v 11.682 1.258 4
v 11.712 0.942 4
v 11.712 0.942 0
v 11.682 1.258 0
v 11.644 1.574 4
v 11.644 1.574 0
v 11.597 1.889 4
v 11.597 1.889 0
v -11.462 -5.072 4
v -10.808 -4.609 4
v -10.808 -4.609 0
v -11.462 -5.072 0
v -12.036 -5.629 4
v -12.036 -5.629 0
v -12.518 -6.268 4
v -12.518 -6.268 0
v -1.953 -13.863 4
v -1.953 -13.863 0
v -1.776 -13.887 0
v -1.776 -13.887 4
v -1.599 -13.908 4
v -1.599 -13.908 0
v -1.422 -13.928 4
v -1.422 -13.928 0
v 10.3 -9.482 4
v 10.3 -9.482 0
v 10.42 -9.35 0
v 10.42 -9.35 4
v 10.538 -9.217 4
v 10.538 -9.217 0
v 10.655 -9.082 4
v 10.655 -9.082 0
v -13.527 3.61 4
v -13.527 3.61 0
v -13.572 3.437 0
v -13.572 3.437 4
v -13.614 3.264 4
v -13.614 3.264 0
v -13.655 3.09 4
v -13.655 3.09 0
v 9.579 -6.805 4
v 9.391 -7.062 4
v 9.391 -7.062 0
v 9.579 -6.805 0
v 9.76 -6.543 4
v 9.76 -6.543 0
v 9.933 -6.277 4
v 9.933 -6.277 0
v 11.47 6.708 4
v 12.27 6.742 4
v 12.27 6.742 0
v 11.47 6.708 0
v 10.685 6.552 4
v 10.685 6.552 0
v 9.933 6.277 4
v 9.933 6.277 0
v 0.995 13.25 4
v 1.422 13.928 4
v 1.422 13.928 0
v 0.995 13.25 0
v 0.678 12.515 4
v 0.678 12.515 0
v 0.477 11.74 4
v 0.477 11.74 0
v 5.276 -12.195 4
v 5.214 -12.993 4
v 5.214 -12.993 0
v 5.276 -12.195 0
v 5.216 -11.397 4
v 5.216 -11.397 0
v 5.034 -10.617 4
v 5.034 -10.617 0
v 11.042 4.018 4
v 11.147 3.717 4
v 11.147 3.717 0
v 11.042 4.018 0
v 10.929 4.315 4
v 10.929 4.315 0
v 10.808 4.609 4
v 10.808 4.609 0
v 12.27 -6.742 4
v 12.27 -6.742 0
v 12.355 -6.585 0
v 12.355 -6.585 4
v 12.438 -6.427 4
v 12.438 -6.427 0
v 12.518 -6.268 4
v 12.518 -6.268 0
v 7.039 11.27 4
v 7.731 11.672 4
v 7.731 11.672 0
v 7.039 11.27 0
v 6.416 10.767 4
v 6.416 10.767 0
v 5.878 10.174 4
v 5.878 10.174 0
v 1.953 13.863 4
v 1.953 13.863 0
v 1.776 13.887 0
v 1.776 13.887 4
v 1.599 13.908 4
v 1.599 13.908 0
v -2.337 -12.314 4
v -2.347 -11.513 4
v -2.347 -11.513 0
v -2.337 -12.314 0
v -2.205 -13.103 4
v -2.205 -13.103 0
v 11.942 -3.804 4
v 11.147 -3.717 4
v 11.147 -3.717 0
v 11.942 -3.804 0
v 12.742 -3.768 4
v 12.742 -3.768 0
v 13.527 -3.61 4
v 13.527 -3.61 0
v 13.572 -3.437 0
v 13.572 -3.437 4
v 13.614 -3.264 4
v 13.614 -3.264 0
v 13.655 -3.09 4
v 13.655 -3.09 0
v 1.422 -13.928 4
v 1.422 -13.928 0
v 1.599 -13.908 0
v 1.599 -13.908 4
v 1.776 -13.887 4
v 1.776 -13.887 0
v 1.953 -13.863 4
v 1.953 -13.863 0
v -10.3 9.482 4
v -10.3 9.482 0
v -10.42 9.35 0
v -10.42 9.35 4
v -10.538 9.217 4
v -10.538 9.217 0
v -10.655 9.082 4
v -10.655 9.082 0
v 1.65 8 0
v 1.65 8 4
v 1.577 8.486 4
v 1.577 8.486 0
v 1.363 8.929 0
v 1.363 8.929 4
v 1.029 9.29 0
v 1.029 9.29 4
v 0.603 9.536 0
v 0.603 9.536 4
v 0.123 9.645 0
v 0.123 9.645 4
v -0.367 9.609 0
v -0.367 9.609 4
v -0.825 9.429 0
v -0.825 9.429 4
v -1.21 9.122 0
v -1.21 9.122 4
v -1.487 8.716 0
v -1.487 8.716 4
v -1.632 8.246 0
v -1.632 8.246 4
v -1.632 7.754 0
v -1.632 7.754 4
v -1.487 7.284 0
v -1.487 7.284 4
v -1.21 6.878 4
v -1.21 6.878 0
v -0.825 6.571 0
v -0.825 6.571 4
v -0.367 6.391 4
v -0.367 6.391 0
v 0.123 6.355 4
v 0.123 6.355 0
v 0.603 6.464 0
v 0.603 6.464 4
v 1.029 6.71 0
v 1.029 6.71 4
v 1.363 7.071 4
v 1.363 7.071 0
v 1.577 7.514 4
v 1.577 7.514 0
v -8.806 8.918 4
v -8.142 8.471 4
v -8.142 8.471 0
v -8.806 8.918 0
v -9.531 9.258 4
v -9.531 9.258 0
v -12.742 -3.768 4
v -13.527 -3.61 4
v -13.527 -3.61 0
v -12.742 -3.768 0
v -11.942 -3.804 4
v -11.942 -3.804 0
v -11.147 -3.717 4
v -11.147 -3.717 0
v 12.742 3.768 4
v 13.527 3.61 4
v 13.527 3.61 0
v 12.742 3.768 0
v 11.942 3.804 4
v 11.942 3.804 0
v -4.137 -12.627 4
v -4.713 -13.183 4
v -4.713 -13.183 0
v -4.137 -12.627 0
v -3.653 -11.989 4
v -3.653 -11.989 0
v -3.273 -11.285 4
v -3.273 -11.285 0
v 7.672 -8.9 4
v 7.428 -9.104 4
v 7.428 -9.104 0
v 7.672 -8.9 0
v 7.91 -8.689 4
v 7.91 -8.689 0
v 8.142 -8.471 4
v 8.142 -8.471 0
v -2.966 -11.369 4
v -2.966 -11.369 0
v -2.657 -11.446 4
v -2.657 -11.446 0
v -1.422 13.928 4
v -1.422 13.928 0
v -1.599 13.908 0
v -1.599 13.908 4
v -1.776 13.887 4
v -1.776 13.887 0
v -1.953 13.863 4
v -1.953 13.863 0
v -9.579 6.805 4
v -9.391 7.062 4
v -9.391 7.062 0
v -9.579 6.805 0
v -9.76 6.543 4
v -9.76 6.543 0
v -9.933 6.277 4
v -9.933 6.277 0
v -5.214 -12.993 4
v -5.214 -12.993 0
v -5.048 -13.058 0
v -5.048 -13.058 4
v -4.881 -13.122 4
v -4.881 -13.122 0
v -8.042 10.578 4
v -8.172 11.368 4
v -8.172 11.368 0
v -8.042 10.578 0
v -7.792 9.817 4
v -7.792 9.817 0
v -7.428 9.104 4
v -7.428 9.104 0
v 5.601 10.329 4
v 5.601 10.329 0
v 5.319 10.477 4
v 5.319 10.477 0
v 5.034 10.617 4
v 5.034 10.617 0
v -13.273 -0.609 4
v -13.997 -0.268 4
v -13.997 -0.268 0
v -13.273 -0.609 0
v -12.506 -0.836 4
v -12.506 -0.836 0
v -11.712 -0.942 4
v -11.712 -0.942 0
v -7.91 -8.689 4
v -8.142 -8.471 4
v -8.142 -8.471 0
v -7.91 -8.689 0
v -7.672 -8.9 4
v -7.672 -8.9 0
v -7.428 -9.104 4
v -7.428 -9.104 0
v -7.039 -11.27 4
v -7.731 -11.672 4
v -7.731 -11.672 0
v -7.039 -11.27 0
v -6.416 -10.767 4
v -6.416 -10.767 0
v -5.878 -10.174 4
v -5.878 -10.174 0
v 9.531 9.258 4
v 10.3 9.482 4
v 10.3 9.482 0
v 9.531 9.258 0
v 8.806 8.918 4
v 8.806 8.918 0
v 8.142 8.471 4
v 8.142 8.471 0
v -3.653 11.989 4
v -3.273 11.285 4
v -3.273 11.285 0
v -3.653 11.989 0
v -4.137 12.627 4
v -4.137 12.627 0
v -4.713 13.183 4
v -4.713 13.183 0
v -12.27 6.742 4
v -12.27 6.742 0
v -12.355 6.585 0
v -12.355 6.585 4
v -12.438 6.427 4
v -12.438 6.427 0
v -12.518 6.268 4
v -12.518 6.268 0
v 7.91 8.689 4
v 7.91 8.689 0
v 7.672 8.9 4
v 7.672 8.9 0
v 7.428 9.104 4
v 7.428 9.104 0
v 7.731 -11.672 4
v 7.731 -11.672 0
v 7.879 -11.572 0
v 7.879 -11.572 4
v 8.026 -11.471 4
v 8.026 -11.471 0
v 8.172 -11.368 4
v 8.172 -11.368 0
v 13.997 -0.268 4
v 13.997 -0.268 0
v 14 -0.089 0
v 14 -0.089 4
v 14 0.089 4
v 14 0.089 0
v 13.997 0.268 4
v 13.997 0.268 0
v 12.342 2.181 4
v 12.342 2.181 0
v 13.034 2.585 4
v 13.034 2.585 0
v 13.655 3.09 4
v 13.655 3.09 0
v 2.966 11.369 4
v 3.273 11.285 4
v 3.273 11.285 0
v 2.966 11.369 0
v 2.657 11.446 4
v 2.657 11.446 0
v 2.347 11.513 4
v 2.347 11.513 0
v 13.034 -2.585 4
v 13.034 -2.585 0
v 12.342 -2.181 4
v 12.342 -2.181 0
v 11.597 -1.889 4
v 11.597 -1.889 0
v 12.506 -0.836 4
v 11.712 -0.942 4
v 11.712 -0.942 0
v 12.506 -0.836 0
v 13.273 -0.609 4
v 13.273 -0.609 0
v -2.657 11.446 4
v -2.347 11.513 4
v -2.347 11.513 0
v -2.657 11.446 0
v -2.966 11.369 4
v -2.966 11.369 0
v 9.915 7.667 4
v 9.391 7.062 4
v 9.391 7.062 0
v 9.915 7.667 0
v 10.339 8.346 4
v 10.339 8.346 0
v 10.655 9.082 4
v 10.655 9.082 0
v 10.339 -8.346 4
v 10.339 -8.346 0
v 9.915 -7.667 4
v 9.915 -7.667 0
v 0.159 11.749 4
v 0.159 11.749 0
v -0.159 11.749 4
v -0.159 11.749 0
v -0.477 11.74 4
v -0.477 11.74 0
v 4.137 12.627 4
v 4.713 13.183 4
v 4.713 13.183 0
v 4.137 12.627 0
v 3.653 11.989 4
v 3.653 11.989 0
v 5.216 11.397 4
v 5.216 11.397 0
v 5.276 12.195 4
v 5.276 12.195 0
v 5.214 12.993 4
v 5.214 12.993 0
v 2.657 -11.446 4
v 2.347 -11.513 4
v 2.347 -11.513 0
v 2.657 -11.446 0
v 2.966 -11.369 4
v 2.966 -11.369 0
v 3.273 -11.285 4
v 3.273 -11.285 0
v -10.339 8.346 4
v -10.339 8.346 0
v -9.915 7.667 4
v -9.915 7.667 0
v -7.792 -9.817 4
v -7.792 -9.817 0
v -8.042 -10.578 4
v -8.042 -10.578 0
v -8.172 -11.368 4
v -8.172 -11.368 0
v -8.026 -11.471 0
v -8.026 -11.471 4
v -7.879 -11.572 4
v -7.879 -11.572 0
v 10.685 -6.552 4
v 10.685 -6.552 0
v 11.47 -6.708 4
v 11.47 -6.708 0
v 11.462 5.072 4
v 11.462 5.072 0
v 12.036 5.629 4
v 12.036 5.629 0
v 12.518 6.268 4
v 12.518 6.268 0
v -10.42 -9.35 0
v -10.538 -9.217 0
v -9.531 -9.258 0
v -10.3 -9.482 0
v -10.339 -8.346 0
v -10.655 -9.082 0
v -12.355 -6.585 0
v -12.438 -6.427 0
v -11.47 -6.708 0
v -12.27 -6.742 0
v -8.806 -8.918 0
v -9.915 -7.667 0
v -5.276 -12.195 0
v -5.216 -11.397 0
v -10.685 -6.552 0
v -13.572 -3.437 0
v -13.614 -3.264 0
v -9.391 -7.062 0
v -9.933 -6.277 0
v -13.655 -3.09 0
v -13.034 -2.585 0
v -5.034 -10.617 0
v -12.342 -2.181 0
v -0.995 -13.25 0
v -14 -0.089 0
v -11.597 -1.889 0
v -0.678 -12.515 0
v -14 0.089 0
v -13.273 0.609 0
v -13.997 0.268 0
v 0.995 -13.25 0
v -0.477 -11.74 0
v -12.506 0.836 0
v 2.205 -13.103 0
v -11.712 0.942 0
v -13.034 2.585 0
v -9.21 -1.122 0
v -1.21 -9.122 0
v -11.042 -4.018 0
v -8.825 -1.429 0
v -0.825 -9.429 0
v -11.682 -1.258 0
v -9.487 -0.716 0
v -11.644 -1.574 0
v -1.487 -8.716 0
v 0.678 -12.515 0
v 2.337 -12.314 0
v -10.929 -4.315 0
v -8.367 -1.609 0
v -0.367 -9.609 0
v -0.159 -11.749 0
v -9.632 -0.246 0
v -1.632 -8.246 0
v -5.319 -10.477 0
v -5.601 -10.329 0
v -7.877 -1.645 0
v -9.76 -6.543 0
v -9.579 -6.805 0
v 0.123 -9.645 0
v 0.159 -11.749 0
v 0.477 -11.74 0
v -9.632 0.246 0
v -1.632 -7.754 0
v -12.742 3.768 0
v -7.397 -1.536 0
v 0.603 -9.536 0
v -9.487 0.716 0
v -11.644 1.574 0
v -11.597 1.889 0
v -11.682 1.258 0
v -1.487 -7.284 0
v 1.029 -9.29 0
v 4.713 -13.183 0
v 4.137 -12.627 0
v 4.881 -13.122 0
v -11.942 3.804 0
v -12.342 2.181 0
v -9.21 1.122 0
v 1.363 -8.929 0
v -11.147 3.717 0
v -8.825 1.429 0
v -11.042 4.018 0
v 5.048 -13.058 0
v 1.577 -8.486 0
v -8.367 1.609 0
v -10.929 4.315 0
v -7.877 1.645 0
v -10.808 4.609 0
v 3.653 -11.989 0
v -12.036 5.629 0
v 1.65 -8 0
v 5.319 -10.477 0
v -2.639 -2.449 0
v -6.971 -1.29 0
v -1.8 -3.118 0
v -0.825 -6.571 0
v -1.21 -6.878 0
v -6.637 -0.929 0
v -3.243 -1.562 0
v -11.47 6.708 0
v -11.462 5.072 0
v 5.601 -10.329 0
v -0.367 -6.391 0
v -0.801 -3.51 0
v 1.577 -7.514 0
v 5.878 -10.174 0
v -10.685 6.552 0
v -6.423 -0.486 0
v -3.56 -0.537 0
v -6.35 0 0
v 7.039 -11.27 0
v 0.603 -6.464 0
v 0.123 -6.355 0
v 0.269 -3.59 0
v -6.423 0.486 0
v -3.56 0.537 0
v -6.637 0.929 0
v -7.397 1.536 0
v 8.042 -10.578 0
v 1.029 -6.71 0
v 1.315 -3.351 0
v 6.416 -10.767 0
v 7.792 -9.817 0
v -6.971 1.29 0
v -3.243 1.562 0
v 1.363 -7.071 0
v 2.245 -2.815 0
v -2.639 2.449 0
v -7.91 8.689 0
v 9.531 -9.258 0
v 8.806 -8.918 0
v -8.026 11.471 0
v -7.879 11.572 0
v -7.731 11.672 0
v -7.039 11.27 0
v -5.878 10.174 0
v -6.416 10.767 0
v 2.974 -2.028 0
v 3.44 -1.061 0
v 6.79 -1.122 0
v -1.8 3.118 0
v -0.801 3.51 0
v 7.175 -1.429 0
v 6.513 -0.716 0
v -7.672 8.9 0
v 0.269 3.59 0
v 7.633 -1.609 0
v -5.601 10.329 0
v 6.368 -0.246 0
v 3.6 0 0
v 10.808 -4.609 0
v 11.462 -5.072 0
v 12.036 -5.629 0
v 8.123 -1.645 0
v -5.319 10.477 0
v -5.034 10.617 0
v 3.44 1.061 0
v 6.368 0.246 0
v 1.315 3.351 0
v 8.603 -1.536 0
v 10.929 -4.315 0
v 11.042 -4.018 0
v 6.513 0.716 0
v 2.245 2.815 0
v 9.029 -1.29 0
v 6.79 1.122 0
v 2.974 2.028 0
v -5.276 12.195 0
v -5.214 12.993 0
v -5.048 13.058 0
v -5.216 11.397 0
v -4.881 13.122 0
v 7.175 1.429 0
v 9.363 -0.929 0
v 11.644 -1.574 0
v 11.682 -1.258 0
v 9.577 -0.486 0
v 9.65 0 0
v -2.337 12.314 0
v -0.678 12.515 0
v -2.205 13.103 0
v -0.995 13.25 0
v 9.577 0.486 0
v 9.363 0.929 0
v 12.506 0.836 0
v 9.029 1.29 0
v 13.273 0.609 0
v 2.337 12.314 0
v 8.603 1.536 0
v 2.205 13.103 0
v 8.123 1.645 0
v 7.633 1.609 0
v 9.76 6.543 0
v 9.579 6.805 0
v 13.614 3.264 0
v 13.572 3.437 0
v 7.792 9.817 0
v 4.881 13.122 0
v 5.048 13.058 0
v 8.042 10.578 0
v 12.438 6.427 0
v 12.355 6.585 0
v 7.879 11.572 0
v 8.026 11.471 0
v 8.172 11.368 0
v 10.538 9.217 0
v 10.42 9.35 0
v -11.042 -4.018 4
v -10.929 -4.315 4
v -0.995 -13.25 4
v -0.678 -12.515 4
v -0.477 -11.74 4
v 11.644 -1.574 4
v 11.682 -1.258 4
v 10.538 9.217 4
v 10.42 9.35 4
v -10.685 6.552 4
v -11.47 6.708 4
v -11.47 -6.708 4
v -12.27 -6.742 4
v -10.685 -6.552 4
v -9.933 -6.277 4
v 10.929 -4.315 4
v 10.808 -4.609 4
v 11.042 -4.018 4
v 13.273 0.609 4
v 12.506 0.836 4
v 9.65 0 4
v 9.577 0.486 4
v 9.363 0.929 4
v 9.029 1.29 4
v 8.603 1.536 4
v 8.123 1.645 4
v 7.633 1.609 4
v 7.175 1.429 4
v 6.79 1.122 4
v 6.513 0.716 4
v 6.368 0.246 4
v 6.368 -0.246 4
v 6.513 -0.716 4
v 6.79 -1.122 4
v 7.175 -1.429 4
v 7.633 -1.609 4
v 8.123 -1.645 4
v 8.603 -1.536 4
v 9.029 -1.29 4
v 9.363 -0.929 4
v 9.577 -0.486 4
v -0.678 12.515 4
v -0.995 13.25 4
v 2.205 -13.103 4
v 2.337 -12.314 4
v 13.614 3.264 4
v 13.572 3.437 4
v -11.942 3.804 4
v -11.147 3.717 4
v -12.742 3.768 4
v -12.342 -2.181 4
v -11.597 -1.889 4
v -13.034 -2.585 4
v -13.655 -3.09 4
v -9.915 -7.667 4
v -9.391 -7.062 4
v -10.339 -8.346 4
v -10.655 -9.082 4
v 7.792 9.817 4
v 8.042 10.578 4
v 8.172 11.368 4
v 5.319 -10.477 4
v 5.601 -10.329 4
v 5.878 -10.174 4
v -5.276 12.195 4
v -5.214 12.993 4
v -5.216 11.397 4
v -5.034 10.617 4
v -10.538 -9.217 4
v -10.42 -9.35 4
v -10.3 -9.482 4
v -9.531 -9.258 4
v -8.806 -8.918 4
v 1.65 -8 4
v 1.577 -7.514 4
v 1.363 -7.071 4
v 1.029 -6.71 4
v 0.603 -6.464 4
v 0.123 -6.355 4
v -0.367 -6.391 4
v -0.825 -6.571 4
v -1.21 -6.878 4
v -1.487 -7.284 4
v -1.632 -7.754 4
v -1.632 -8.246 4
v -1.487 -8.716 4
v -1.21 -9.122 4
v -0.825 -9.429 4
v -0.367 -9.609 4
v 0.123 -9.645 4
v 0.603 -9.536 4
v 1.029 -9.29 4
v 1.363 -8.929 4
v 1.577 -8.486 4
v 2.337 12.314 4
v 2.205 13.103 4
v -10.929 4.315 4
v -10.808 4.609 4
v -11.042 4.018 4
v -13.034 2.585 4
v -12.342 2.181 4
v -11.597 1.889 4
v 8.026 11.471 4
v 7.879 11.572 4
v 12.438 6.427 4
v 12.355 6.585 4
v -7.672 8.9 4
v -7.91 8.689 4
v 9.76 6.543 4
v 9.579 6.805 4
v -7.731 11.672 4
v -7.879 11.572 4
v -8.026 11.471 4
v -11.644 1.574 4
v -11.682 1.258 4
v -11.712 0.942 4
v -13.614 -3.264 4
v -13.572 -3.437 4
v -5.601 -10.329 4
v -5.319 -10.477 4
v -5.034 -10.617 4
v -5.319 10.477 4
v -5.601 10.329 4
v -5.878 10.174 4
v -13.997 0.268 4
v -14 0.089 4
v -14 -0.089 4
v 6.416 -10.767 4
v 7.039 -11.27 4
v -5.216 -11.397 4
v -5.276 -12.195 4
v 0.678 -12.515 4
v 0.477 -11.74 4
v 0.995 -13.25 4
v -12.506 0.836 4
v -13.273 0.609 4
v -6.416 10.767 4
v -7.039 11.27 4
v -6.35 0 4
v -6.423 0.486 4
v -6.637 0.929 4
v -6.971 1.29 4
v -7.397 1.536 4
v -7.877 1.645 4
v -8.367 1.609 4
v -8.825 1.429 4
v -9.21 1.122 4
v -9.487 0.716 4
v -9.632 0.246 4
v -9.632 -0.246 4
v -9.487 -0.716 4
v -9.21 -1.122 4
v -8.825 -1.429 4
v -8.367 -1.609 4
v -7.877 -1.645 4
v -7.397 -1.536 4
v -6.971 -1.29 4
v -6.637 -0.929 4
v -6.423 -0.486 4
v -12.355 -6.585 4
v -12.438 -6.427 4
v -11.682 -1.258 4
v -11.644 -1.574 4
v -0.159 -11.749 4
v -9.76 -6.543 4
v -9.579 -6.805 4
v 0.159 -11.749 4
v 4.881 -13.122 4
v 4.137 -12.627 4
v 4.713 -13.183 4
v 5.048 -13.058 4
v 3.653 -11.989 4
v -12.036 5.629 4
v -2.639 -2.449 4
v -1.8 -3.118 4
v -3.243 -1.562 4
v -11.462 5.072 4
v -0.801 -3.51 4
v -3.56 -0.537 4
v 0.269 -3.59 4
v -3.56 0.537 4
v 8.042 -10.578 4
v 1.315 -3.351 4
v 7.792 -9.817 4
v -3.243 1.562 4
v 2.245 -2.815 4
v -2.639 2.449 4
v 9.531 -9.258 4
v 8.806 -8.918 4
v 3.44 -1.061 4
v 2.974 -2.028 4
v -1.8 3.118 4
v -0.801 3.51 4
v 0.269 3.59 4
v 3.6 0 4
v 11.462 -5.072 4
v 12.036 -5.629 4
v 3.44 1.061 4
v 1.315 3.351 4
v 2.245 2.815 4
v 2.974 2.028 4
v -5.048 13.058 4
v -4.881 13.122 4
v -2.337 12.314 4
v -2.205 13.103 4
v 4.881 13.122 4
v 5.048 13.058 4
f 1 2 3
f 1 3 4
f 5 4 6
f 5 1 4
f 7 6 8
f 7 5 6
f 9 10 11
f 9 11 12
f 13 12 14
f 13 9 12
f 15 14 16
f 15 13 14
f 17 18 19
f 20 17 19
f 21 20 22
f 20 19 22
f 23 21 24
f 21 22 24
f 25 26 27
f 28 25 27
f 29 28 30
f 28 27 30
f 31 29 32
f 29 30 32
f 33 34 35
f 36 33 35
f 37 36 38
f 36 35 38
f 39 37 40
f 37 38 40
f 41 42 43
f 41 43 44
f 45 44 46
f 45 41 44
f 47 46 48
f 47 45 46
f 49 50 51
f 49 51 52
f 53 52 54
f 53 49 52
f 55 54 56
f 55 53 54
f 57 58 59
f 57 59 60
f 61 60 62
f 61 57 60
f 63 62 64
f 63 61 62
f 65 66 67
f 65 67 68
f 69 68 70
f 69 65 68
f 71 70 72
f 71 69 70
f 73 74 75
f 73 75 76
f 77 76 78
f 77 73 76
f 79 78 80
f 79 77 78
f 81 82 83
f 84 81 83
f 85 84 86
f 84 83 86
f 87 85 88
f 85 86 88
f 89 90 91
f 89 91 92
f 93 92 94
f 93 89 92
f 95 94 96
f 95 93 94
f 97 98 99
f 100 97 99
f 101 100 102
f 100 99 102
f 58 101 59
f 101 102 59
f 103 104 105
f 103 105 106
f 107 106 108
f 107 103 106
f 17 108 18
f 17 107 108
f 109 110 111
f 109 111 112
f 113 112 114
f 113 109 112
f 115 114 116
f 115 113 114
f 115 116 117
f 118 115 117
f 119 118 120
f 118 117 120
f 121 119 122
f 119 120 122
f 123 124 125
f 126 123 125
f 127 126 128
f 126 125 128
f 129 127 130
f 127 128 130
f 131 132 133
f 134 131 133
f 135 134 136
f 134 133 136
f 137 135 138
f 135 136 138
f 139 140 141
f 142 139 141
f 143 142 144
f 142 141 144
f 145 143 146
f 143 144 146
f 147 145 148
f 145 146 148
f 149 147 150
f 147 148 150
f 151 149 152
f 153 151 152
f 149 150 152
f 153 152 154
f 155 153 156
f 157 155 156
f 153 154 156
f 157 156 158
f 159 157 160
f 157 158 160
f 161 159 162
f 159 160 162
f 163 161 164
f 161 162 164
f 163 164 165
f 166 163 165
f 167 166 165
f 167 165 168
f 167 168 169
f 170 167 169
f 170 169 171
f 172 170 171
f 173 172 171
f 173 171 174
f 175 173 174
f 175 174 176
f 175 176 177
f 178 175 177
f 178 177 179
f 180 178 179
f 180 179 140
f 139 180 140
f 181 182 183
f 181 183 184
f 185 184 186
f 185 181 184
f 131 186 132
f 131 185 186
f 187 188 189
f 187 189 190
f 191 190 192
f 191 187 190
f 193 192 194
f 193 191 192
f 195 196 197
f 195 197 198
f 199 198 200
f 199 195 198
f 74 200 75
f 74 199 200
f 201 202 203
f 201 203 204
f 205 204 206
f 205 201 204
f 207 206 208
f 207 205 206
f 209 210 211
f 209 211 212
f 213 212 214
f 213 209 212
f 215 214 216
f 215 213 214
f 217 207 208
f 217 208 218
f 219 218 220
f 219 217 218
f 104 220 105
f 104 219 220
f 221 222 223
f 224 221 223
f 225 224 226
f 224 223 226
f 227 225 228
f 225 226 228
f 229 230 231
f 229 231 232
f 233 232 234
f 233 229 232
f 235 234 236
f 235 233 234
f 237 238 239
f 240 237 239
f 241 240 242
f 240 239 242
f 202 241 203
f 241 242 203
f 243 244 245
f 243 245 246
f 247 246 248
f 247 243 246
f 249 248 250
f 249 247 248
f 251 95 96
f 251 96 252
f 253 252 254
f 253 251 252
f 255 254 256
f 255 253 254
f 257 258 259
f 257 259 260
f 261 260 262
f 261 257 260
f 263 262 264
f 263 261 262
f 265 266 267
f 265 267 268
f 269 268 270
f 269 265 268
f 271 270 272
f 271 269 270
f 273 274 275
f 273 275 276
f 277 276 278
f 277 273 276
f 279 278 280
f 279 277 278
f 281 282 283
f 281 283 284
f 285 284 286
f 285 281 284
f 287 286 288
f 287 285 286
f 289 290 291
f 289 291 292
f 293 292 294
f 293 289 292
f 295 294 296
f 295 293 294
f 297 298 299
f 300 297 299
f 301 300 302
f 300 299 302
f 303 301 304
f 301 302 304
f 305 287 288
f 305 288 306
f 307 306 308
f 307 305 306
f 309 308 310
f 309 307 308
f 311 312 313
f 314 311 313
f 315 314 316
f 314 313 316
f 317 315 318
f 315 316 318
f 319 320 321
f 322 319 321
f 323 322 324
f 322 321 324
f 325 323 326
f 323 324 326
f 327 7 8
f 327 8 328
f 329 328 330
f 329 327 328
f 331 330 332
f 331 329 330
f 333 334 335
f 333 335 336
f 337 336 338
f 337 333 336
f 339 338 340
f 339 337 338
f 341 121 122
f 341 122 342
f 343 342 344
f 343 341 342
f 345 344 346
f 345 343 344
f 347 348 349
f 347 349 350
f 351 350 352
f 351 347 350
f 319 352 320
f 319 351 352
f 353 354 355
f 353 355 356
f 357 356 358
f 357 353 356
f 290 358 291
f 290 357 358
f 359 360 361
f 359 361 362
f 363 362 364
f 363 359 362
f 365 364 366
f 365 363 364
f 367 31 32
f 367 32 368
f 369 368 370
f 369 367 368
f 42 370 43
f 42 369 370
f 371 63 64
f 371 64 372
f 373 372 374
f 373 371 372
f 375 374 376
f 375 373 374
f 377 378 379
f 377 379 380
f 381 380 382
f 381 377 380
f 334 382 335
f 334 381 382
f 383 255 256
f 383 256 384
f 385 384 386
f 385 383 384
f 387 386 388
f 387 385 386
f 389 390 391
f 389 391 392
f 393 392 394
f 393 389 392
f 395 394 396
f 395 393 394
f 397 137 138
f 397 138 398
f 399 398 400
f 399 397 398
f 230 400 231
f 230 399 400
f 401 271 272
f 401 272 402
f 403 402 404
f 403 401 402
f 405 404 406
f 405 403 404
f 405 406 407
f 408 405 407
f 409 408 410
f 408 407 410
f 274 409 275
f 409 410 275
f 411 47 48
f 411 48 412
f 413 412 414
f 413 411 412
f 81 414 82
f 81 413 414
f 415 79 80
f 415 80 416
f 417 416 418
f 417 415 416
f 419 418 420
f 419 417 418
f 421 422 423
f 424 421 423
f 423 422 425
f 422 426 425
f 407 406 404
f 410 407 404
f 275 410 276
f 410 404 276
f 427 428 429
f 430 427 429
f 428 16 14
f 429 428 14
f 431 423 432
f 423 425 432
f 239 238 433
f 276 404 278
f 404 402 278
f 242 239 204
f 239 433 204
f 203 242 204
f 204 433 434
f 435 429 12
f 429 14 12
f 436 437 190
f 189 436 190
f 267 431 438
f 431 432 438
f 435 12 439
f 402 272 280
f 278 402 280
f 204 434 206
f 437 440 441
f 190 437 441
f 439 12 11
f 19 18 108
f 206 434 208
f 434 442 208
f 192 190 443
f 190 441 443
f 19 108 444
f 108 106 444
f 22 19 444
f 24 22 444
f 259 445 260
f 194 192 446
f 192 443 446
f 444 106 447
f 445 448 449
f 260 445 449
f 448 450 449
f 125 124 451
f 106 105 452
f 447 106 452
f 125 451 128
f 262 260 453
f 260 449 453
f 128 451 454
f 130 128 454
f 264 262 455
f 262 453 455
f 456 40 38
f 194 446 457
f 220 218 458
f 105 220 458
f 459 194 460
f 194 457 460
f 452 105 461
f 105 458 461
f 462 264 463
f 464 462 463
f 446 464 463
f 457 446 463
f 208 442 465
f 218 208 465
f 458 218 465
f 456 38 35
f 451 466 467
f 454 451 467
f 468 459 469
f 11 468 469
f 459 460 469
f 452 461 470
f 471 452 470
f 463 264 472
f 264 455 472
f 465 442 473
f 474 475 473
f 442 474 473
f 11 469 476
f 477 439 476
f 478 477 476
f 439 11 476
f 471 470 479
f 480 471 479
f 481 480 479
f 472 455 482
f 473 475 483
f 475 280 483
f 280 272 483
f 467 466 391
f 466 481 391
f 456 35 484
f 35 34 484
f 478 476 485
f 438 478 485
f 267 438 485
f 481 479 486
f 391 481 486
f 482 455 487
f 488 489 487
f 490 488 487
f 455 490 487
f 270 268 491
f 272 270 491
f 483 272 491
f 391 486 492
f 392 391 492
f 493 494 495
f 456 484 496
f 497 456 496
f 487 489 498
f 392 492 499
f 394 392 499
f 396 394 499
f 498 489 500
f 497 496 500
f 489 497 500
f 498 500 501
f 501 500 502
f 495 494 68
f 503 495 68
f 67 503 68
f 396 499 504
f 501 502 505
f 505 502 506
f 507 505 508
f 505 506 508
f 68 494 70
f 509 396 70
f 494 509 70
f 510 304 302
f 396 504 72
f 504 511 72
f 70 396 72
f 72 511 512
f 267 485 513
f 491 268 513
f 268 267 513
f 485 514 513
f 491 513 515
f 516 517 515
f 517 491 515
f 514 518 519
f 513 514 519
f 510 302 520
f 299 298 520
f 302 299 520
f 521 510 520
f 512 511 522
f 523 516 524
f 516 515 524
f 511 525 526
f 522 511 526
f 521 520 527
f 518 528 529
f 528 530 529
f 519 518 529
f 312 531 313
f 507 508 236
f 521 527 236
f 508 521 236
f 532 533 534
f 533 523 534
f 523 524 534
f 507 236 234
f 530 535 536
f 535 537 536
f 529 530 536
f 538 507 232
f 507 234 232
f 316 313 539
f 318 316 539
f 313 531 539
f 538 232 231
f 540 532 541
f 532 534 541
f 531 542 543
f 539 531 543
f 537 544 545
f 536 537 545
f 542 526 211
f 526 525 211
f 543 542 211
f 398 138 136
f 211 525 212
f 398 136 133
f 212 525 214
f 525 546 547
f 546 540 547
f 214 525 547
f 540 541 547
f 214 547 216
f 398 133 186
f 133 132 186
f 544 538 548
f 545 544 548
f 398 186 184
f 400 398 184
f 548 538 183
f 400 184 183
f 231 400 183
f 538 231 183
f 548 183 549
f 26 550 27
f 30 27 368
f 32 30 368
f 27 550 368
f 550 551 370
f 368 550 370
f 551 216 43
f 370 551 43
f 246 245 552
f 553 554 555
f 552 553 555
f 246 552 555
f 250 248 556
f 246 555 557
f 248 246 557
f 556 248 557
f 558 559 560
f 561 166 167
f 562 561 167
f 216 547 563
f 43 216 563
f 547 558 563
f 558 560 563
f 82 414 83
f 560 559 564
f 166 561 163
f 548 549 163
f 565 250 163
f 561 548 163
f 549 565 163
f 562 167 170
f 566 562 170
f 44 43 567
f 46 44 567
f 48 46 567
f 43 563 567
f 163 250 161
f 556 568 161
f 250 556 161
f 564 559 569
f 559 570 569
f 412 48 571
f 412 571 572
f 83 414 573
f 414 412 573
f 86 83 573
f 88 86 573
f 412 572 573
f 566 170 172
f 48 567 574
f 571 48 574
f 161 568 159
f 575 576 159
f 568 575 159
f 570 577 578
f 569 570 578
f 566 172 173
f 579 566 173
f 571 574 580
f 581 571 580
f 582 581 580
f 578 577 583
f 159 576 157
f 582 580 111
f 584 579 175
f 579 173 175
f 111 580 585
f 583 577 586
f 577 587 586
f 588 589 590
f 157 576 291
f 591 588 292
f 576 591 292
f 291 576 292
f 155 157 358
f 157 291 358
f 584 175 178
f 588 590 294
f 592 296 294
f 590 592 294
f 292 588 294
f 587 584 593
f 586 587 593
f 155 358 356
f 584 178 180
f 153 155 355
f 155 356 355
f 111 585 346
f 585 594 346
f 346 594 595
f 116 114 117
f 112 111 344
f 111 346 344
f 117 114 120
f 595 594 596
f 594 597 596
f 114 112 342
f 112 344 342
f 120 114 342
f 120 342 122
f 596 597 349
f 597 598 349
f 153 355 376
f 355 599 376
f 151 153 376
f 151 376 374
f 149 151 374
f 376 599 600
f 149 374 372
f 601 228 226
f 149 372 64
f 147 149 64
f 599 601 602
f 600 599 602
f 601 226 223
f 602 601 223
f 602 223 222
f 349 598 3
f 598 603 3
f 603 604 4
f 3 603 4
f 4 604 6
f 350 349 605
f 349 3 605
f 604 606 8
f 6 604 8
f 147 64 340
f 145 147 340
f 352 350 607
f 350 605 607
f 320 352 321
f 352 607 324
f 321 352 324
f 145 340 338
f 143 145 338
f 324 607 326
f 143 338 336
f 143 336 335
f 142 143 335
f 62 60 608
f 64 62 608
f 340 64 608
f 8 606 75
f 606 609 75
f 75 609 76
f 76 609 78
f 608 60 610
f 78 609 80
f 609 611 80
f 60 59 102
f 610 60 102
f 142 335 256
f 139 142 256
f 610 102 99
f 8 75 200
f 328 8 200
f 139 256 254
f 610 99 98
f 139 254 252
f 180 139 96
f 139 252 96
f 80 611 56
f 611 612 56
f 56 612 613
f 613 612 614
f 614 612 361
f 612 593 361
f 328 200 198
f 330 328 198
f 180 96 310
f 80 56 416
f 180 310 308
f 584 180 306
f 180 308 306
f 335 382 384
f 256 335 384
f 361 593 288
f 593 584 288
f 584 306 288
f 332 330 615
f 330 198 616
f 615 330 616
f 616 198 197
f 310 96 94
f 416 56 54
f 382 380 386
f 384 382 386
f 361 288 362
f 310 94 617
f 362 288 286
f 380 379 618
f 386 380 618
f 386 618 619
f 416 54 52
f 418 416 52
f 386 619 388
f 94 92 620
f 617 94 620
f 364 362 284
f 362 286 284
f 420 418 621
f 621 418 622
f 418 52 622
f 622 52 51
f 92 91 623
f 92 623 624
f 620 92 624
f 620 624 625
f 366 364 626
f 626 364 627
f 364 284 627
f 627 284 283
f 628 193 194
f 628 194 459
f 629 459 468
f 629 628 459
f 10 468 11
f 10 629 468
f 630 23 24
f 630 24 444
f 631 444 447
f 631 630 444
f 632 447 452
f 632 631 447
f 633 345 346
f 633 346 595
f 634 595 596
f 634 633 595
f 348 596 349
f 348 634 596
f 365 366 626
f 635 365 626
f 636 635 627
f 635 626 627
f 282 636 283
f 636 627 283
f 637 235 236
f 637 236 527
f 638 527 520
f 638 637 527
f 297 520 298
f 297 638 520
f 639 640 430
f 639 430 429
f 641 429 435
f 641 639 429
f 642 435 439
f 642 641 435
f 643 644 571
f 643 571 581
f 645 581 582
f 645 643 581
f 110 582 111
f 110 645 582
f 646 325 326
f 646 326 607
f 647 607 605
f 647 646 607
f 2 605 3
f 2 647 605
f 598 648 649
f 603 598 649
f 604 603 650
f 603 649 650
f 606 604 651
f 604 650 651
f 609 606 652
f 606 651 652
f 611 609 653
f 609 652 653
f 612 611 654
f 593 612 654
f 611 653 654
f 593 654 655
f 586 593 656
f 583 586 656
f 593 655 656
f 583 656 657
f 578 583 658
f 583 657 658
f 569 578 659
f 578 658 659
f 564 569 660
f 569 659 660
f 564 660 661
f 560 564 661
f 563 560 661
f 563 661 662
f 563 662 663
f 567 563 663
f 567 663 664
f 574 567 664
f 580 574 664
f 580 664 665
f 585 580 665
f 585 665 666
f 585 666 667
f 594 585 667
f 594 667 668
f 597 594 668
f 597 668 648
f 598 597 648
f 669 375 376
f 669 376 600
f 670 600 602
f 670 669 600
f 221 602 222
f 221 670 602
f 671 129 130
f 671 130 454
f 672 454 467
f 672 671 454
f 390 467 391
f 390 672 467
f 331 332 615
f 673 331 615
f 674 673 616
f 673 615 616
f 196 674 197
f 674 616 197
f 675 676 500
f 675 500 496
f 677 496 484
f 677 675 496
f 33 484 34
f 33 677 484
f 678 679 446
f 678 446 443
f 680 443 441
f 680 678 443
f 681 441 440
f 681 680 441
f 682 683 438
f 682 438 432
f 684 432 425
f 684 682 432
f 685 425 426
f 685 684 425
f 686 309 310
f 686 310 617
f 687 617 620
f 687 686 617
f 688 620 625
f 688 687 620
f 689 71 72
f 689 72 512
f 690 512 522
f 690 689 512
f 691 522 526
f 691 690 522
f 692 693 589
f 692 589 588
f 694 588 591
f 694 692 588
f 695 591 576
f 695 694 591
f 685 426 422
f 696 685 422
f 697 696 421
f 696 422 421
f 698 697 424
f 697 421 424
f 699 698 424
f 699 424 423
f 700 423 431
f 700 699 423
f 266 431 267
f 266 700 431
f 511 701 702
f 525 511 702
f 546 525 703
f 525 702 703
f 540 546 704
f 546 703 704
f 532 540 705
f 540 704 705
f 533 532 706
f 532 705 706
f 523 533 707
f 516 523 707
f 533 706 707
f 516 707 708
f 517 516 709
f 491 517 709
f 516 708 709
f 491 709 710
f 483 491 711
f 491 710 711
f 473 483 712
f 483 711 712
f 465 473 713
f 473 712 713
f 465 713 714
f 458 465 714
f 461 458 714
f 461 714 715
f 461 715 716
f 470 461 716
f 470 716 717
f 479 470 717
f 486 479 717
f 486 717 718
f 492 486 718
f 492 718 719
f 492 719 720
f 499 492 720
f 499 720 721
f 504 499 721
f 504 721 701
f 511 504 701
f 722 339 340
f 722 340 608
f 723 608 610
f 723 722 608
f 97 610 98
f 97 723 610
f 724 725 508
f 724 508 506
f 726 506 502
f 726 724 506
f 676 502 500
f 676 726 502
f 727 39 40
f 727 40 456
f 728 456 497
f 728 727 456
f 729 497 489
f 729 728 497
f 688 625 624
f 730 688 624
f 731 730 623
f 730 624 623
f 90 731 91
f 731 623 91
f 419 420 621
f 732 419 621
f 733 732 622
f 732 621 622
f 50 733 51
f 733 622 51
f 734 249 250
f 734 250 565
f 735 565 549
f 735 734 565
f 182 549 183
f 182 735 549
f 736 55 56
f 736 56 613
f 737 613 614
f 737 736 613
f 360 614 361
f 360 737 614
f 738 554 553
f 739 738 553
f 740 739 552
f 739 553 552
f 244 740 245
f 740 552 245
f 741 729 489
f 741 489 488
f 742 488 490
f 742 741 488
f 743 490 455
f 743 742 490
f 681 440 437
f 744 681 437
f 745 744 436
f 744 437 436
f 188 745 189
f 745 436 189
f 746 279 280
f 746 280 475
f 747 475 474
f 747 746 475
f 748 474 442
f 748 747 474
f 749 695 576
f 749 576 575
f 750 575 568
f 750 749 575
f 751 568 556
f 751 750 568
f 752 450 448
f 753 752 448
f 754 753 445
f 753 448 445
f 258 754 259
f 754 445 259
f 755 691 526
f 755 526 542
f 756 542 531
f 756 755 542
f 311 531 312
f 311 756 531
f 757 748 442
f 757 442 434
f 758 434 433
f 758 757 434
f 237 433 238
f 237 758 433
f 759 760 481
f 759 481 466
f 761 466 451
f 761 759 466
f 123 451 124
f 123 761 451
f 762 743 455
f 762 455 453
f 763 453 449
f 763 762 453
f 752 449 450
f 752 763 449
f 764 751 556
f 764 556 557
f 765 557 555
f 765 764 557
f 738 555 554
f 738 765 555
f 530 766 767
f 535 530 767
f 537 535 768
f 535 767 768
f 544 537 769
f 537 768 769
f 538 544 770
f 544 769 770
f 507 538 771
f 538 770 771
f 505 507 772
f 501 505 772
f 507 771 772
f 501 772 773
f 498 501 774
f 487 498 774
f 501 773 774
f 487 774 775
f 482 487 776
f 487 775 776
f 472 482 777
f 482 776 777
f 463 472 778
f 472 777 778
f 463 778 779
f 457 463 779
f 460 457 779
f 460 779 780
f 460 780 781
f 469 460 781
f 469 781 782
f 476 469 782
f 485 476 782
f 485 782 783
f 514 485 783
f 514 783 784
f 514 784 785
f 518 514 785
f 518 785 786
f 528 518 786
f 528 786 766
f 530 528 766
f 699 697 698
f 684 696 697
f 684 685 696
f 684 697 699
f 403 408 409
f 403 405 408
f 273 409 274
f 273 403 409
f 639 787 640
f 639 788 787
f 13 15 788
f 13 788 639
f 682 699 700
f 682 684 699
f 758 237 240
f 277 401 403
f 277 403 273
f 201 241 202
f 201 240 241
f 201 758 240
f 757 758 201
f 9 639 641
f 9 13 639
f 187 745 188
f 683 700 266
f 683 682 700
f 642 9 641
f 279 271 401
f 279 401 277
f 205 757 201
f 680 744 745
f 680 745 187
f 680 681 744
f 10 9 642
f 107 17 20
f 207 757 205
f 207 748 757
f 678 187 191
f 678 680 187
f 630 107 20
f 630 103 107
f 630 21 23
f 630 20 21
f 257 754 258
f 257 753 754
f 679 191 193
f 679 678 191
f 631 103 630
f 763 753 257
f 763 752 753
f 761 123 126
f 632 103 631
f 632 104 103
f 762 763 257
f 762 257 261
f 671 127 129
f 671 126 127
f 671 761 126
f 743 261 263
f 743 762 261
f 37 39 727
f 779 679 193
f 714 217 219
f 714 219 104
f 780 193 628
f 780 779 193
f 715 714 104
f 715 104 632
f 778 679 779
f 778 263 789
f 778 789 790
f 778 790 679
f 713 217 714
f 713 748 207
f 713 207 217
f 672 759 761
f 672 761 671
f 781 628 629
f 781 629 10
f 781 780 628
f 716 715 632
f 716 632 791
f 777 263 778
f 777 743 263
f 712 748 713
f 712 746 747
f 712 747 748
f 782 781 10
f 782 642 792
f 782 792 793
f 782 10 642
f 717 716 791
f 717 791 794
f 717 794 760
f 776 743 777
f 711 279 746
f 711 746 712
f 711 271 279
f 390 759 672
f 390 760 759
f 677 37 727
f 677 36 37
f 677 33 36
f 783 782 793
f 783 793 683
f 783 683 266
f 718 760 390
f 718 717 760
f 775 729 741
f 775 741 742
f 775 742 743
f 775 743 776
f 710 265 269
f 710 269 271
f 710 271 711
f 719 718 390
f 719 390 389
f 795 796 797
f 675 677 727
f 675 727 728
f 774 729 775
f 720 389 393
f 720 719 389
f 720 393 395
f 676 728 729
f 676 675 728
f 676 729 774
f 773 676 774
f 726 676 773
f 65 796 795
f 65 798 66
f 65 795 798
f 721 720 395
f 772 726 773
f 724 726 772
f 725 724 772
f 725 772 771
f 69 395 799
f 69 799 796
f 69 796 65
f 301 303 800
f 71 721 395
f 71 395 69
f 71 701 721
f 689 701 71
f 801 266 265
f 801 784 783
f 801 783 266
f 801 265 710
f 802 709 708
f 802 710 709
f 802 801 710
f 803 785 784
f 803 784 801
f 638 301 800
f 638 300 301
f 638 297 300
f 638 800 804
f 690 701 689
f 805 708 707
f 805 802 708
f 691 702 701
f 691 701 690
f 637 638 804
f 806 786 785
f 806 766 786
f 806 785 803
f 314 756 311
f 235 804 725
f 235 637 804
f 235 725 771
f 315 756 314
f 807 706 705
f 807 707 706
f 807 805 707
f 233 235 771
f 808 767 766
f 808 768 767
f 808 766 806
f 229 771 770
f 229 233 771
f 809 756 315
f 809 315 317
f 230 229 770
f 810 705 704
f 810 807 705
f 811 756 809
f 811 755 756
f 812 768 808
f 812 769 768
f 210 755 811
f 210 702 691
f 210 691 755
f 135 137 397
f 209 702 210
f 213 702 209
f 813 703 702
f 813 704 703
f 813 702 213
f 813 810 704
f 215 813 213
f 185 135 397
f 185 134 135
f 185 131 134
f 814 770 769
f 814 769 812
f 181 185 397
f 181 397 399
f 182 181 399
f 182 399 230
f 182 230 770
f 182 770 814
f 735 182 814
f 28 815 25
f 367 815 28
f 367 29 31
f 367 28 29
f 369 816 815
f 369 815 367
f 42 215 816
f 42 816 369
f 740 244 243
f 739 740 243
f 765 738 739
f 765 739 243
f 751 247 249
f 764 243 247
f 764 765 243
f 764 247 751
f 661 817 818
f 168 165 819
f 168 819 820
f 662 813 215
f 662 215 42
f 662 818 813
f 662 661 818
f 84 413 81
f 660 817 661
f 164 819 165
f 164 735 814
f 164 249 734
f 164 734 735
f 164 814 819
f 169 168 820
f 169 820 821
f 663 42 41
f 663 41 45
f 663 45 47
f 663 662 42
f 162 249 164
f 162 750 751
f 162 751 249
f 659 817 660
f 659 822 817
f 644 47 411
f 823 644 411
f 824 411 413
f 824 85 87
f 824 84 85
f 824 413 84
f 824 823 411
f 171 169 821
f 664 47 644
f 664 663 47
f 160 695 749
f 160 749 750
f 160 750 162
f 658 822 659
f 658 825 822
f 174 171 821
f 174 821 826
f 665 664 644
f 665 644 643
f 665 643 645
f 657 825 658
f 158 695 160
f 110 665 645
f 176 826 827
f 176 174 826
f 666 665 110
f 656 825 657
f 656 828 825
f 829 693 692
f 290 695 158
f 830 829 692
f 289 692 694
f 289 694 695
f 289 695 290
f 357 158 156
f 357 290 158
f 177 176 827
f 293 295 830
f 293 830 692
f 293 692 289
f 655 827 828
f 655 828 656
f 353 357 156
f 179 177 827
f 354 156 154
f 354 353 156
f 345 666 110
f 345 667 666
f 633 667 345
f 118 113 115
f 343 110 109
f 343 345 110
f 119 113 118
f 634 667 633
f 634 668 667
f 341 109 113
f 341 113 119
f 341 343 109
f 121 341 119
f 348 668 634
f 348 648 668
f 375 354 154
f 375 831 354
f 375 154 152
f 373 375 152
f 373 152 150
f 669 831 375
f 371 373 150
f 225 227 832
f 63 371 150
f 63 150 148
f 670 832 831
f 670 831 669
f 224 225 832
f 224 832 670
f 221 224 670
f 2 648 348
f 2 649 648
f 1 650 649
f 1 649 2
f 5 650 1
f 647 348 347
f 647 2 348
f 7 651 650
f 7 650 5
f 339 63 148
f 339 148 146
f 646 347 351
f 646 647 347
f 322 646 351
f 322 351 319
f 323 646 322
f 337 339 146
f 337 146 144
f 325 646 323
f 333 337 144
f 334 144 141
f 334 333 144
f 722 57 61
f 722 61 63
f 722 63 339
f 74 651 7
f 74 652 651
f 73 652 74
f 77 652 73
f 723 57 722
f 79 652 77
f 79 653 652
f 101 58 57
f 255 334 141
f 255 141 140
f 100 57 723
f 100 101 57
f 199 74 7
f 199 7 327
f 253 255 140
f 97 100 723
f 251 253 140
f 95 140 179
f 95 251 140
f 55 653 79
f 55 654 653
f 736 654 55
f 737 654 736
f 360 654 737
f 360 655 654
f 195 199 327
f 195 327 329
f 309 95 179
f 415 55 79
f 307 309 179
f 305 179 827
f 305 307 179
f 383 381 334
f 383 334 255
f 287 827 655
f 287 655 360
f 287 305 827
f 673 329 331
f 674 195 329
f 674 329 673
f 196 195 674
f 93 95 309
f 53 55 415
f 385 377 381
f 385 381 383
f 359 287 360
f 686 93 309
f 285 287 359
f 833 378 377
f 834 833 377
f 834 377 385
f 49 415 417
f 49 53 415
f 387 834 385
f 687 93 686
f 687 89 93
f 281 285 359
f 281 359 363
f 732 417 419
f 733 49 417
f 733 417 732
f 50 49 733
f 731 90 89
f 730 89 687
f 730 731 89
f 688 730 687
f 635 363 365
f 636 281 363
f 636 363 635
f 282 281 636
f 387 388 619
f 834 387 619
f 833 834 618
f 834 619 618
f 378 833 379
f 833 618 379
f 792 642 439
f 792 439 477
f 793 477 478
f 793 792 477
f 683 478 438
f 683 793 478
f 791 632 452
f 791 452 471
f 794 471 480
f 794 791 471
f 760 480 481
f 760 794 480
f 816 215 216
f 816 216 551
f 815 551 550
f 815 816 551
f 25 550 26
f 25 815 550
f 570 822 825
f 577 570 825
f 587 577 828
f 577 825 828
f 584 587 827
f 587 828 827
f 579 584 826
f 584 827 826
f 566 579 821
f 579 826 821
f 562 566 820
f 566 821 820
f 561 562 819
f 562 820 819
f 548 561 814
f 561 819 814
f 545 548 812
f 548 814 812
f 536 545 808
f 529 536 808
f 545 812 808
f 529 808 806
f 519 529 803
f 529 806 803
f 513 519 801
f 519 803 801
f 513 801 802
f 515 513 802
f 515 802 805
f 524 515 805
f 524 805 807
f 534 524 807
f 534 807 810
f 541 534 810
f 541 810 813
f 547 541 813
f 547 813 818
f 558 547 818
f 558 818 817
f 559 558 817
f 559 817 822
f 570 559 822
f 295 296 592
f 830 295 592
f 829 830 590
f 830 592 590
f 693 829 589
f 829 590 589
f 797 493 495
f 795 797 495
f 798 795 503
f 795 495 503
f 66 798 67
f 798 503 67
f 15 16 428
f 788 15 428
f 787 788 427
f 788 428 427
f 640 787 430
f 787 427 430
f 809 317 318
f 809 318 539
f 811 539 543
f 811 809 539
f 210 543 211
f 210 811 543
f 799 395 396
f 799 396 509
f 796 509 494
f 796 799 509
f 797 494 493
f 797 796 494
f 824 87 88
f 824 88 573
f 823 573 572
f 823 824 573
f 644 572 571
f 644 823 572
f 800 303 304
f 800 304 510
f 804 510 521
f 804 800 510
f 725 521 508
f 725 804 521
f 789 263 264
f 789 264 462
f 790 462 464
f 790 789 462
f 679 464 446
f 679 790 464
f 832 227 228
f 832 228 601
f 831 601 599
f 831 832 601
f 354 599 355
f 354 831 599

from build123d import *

# Parameters (mm, degrees)
SKETCH_1_R               = 14
EXTRUDE_1_DEPTH          = 4
CUT_EXTRUDE_1_DEPTH      = 4
PATTERN_CIRCULAR_1_COUNT = 26
CUT_EXTRUDE_2_REACH      = 6
SKETCH_5_R               = 3.6
SKETCH_5_R_2             = 1.65


with BuildPart() as part:
    # 草圖1 → 填料-伸長1 (new body)
    with BuildSketch(Plane.XY):
        Circle(SKETCH_1_R)
    extrude(amount=EXTRUDE_1_DEPTH)

    # 草圖4 → 除料-伸長1 (cut)
    with BuildSketch(Plane.XY.offset(4)):
        with BuildLine():
            ThreePointArc((-1.421594657, 13.927636865), (0, 14), (1.421594657, 13.927636865))
            ThreePointArc((1.421594657, 13.927636865), (0.822322703, 12.888806427), (0.476978653, 11.74031479))
            ThreePointArc((0.476978653, 11.74031479), (0, 11.75), (-0.476978653, 11.74031479))
            ThreePointArc((-0.476978653, 11.74031479), (-0.822322703, 12.888806427), (-1.421594657, 13.927636865))
        make_face()
    cut_extrude_1 = extrude(amount=-CUT_EXTRUDE_1_DEPTH, mode=Mode.SUBTRACT)

    # 環狀複製排列1: 除料-伸長1 ×26 about axis
    pattern_circular_1_axis = Axis((0, 0, 0), (0, 0, 1))
    for i in range(1, PATTERN_CIRCULAR_1_COUNT):
        add(cut_extrude_1.rotate(pattern_circular_1_axis, i * 360 / PATTERN_CIRCULAR_1_COUNT), mode=Mode.SUBTRACT)

    # 草圖5 → 除料-伸長2 (cut, up to next)
    with BuildSketch(Plane.XY.offset(4), mode=Mode.PRIVATE) as cut_extrude_2_sk1:
        Circle(SKETCH_5_R)
    cut_extrude_2_tool1 = extrude(cut_extrude_2_sk1.sketch, amount=-CUT_EXTRUDE_2_REACH, mode=Mode.PRIVATE) & part.part
    add(cut_extrude_2_tool1.solids().sort_by_distance((0, 0, 4))[0], mode=Mode.SUBTRACT)
    # 草圖5 → 除料-伸長2 (cut, up to next)
    with BuildSketch(Plane.XY.offset(4), mode=Mode.PRIVATE) as cut_extrude_2_sk2:
        with Locations((0, 8)):
            Circle(SKETCH_5_R_2)
    cut_extrude_2_tool2 = extrude(cut_extrude_2_sk2.sketch, amount=-CUT_EXTRUDE_2_REACH, mode=Mode.PRIVATE) & part.part
    add(cut_extrude_2_tool2.solids().sort_by_distance((0, 8, 4))[0], mode=Mode.SUBTRACT)
    # 草圖5 → 除料-伸長2 (cut, up to next)
    with BuildSketch(Plane.XY.offset(4), mode=Mode.PRIVATE) as cut_extrude_2_sk3:
        with Locations((8, 0)):
            Circle(SKETCH_5_R_2)
    cut_extrude_2_tool3 = extrude(cut_extrude_2_sk3.sketch, amount=-CUT_EXTRUDE_2_REACH, mode=Mode.PRIVATE) & part.part
    add(cut_extrude_2_tool3.solids().sort_by_distance((8, 0, 4))[0], mode=Mode.SUBTRACT)
    # 草圖5 → 除料-伸長2 (cut, up to next)
    with BuildSketch(Plane.XY.offset(4), mode=Mode.PRIVATE) as cut_extrude_2_sk4:
        with Locations((0, -8)):
            Circle(SKETCH_5_R_2)
    cut_extrude_2_tool4 = extrude(cut_extrude_2_sk4.sketch, amount=-CUT_EXTRUDE_2_REACH, mode=Mode.PRIVATE) & part.part
    add(cut_extrude_2_tool4.solids().sort_by_distance((0, -8, 4))[0], mode=Mode.SUBTRACT)
    # 草圖5 → 除料-伸長2 (cut, up to next)
    with BuildSketch(Plane.XY.offset(4), mode=Mode.PRIVATE) as cut_extrude_2_sk5:
        with Locations((-8, 0)):
            Circle(SKETCH_5_R_2)
    cut_extrude_2_tool5 = extrude(cut_extrude_2_sk5.sketch, amount=-CUT_EXTRUDE_2_REACH, mode=Mode.PRIVATE) & part.part
    add(cut_extrude_2_tool5.solids().sort_by_distance((-8, 0, 4))[0], mode=Mode.SUBTRACT)


solid = part.part
